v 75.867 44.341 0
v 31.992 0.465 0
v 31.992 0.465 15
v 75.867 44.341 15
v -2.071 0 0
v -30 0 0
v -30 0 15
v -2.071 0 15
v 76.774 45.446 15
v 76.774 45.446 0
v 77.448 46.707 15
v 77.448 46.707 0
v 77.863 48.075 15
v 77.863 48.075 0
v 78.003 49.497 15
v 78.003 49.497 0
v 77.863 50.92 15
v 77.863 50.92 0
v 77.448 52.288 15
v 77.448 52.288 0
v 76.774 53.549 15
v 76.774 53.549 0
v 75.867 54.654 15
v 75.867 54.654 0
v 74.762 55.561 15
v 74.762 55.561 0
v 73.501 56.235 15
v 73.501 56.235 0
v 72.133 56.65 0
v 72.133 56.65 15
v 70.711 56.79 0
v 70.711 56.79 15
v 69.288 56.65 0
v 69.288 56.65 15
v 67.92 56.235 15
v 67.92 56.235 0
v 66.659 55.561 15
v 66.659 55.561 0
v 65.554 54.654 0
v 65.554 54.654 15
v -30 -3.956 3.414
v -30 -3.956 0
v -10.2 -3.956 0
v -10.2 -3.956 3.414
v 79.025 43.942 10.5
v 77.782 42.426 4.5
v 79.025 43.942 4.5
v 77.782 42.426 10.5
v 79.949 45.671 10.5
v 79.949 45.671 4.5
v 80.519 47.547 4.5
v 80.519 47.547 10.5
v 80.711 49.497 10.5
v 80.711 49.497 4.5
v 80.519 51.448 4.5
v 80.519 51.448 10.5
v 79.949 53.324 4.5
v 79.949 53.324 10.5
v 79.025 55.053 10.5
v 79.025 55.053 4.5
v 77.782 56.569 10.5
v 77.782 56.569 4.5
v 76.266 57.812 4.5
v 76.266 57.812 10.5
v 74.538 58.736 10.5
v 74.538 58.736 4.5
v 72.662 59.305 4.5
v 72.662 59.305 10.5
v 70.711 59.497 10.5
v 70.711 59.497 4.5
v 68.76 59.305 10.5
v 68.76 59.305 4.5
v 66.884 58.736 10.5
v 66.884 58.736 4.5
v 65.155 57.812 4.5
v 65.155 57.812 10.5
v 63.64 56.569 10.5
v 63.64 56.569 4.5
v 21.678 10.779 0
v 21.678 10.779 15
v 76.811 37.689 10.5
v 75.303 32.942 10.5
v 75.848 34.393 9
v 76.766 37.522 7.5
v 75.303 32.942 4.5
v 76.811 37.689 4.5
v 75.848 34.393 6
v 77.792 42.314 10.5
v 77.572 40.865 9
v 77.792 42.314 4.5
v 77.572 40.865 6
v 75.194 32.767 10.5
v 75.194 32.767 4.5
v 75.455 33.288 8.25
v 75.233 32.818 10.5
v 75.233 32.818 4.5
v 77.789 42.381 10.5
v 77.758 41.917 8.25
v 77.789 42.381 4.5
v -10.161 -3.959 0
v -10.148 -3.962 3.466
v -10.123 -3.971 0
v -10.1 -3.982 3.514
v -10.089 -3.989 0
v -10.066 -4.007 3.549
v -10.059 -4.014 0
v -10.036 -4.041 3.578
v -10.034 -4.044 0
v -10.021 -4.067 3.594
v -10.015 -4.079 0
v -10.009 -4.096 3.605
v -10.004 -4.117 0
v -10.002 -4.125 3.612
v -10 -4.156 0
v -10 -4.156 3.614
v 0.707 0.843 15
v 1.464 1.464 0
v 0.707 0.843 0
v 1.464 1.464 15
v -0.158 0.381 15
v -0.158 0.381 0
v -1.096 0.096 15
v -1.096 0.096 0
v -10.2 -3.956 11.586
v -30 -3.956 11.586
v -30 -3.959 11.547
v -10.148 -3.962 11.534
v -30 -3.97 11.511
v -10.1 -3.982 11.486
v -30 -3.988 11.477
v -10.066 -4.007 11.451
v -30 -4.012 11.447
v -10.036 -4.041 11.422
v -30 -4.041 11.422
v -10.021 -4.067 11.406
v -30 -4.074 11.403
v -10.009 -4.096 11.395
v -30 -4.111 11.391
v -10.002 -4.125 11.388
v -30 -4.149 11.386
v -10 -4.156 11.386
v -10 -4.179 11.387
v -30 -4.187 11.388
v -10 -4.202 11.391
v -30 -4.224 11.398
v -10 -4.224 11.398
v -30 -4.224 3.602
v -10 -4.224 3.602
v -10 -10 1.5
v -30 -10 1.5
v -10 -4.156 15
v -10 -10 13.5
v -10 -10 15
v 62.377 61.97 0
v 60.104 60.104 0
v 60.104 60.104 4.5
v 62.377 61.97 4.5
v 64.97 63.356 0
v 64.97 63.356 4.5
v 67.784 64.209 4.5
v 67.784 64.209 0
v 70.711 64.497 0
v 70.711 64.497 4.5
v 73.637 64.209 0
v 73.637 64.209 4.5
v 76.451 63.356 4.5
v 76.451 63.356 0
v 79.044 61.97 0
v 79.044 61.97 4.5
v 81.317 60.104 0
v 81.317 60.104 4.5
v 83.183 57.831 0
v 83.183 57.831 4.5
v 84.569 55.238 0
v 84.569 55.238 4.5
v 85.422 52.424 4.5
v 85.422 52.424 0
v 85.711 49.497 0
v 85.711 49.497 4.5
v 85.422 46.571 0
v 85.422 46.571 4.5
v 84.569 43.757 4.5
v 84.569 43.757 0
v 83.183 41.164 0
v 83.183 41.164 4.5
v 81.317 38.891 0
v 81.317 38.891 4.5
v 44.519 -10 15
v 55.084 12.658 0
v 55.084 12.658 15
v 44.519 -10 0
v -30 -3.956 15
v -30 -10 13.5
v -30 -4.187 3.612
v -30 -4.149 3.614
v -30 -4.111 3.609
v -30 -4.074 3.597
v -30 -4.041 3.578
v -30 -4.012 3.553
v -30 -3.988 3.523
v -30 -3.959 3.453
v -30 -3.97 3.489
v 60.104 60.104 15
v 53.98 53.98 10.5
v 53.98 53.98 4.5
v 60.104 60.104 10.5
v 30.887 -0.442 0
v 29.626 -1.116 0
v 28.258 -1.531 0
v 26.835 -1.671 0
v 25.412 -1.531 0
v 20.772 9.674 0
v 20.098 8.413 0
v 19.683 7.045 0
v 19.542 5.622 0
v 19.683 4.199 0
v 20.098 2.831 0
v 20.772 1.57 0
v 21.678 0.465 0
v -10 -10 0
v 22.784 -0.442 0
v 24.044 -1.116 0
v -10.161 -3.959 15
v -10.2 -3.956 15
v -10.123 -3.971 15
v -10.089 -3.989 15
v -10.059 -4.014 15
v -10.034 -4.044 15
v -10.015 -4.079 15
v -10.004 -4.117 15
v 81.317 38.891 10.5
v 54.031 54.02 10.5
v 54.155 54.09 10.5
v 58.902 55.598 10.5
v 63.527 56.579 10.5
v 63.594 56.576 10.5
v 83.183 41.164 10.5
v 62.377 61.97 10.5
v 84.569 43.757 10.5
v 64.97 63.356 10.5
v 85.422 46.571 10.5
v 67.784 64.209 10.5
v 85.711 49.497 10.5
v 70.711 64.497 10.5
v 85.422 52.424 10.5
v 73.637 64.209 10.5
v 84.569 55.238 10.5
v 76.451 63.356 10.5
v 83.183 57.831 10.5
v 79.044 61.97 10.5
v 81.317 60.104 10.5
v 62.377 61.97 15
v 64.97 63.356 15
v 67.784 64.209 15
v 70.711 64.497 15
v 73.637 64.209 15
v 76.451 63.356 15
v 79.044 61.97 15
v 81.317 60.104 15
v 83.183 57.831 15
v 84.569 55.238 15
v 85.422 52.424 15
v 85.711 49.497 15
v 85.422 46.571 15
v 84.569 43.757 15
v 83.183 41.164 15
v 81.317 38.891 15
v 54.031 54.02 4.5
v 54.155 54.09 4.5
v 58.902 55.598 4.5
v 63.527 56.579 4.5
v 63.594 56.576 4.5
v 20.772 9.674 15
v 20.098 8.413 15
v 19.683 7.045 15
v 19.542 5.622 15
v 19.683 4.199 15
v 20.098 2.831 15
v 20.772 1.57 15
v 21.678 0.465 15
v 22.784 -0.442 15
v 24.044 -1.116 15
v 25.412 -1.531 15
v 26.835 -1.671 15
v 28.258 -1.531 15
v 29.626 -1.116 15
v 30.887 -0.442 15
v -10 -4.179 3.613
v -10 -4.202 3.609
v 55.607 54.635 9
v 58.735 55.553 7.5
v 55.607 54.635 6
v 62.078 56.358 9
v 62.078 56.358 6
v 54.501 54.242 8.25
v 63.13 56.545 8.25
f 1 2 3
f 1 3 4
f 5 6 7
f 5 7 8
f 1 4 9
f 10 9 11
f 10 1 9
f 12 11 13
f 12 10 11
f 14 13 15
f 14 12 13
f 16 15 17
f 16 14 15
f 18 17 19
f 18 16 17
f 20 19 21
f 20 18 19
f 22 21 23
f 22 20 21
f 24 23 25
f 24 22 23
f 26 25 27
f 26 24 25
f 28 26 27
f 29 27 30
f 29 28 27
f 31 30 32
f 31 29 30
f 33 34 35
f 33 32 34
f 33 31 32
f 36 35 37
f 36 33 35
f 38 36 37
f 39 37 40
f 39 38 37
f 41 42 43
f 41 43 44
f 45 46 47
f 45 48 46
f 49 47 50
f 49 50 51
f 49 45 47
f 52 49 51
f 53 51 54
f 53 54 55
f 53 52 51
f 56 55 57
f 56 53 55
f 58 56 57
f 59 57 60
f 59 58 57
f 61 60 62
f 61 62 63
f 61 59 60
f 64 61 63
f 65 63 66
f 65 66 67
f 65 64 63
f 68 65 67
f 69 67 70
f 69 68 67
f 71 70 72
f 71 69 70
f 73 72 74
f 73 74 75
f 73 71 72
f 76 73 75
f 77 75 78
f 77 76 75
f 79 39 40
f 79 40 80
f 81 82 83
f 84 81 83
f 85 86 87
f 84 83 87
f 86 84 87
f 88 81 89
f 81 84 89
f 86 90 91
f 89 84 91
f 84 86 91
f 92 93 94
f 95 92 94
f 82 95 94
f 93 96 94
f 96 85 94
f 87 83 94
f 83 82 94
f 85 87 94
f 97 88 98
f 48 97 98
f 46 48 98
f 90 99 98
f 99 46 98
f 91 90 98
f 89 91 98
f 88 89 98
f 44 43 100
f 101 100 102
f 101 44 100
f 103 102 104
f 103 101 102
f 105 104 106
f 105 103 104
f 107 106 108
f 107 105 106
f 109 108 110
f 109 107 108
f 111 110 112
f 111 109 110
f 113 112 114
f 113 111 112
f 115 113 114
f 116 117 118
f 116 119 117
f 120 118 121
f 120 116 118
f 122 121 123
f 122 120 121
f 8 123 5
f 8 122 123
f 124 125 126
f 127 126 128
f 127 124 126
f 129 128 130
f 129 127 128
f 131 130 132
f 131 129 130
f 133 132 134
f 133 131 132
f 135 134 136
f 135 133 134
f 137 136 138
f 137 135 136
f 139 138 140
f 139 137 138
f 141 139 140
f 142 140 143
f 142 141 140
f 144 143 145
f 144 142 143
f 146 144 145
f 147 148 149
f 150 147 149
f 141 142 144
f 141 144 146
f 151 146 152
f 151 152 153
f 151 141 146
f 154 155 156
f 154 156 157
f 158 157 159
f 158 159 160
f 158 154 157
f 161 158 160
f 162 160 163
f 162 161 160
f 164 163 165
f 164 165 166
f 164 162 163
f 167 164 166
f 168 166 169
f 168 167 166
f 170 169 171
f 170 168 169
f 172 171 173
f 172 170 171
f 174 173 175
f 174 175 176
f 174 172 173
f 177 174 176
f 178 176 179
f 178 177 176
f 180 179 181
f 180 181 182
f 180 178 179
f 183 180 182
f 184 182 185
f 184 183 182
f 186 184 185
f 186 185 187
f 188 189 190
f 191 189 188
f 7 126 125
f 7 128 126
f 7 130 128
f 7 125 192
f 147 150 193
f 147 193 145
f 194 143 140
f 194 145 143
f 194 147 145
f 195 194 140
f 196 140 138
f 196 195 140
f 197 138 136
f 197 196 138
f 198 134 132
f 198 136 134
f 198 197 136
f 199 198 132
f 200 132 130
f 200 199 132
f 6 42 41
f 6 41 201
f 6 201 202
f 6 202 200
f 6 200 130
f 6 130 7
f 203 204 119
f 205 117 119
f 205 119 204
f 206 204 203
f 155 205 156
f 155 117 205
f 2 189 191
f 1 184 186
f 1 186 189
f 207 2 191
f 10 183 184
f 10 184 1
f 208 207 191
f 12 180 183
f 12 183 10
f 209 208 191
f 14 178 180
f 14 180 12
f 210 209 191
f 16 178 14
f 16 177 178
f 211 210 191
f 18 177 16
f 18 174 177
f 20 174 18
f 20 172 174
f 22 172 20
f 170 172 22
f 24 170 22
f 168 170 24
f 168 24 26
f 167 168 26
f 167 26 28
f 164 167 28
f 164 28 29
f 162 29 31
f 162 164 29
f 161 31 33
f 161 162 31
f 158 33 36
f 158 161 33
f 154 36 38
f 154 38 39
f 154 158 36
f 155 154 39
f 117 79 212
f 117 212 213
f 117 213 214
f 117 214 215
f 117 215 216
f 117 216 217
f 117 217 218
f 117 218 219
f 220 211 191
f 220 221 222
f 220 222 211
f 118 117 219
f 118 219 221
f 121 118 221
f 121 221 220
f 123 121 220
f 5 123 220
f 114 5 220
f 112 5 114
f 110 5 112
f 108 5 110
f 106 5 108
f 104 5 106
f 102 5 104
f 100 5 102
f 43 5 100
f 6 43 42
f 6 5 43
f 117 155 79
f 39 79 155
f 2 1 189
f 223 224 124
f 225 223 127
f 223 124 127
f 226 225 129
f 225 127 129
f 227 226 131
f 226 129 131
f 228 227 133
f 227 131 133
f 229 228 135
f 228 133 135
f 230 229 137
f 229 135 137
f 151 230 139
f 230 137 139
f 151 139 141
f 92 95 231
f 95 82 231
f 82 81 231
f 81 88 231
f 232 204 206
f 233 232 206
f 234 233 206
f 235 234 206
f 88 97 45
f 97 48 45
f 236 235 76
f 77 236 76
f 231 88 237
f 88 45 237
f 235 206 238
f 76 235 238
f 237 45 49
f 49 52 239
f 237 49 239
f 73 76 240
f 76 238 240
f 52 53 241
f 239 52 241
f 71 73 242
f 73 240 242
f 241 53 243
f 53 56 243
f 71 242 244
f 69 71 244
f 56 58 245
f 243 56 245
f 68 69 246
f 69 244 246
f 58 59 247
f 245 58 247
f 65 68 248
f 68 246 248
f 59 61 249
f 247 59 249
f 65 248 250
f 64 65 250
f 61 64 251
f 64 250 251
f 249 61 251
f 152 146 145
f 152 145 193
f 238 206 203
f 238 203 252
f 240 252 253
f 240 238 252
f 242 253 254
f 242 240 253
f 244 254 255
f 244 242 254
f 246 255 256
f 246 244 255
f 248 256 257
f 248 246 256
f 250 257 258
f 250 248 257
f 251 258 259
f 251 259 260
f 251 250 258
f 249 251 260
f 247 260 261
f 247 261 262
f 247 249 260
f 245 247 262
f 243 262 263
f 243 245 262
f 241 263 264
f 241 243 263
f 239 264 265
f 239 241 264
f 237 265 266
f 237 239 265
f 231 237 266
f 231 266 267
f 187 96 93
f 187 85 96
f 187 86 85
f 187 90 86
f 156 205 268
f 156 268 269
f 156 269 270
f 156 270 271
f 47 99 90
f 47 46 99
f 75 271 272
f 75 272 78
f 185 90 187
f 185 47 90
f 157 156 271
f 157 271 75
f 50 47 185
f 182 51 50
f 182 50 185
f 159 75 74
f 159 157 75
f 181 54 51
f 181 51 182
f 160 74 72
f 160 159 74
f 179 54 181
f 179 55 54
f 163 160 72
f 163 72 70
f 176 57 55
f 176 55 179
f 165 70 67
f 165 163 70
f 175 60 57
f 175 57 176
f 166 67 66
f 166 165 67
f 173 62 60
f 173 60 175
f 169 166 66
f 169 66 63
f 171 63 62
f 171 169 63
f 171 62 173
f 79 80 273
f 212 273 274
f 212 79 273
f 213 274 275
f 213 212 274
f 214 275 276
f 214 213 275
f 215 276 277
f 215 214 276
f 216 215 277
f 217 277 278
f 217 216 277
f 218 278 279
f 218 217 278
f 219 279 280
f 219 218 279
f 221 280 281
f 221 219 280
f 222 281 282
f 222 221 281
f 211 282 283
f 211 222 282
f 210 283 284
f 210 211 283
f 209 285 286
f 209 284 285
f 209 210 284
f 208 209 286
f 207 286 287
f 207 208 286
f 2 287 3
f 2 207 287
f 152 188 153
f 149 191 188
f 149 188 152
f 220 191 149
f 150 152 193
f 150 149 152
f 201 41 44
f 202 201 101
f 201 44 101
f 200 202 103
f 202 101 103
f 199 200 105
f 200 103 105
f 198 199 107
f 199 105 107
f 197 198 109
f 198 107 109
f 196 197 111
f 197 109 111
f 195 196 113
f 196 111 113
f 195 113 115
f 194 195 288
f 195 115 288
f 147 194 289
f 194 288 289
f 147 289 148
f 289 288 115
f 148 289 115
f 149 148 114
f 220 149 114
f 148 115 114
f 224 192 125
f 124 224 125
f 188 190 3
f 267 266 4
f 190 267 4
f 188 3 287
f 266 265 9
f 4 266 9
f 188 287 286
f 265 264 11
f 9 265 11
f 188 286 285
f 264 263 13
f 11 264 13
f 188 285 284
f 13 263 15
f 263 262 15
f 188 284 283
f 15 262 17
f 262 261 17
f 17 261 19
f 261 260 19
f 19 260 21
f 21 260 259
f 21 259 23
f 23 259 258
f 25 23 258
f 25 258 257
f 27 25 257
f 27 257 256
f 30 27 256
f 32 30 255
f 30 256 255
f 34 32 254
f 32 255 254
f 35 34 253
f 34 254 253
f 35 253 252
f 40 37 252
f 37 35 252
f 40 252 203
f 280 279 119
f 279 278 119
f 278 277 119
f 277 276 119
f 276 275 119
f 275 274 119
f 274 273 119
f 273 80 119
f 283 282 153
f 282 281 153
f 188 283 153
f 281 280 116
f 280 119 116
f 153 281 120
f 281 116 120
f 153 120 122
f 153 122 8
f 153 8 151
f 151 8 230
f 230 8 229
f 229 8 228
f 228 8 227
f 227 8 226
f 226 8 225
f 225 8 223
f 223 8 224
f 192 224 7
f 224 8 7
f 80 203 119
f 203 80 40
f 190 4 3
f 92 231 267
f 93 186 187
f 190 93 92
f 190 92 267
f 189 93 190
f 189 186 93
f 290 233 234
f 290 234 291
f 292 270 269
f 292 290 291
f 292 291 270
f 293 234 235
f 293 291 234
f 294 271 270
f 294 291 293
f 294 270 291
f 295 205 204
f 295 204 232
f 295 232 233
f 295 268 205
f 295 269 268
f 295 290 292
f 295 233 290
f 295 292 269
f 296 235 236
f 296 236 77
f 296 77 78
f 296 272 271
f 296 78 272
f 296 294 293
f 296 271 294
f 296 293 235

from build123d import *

# Parameters (mm, degrees)
BOSS_EXTRUDE1_DEPTH = 15
FILLET1_R           = 5
SKETCH4_W           = 6
SKETCH4_H           = 10
FILLET3_START       = 4.5
FILLET3_DEPTH       = 6
CUT_EXTRUDE1_REACH  = 110.311
CUT_EXTRUDE2_DEPTH  = 20
FILLET4_R           = 0.2


with BuildPart() as part:
    # Sketch1 → Boss-Extrude1 (new body)
    with BuildSketch(Plane.XY):
        with BuildLine():
            Line((0, 0), (60.104076401, 60.104076401))
            ThreePointArc((60.104076401, 60.104076401), (81.317279836, 60.104076401), (81.317279836, 38.890872965))
            Line((81.317279836, 38.890872965), (55.084101547, 12.657694676))
            Line((55.084101547, 12.657694676), (44.518645004, -10))
            Line((44.518645004, -10), (-30, -10))
            Line((-30, -10), (-30, 0))
            Line((-30, 0), (0, 0))
        make_face()
    extrude(amount=BOSS_EXTRUDE1_DEPTH)

    # Fillet1
    fillet1_edges = [part.edges().sort_by_distance(p)[0] for p in [
        (0, 0, 7.5),
    ]]
    fillet(fillet1_edges, radius=FILLET1_R)

    # Cut-Sweep1: sweep along a path in Sketch3
    with BuildLine(Plane.XY.offset(7.5)) as cut_sweep1_path:
        ThreePointArc((81.317279836, 38.890872965), (81.317279836, 60.104076401), (60.104076401, 60.104076401))
    # Sketch4 → Cut-Sweep1 (sweep, cut)
    with BuildSketch(Plane(origin=(60.104076401, 60.104076401, 0), x_dir=(0, 0, -1), z_dir=(-0.7071067811865462, -0.7071067811865489, 0))):
        with Locations((-7.5, 0)):
            Rectangle(SKETCH4_W, SKETCH4_H)
    sweep(path=cut_sweep1_path.line, mode=Mode.SUBTRACT)

    # Fillet3: read off the stored shape, not the designer's step
    # Fillet3 outline → Fillet3 (cut)
    with BuildSketch(Plane.XY.offset(FILLET3_START)):
        with BuildLine():
            add(Edge.make_bspline(
                [(75.193555479, 32.767148608), (79.276038384, 36.849631513), (77.781745931, 42.426406871)],
                knots=[0, 0, 0, 1, 1, 1], degree=2, weights=[1, 0.111111111, 1]))
            Line((75.193555479, 32.767148608), (81.317279836, 38.890872965))
            Line((81.317279836, 38.890872965), (77.781745931, 42.426406871))
        make_face()
        with BuildLine():
            Line((60.104076401, 60.104076401), (53.980352044, 53.980352044))
            add(Edge.make_bspline(
                [(53.980352044, 53.980352044), (58.062834949, 58.062834949), (63.639610307, 56.568542495)],
                knots=[0, 0, 0, 1, 1, 1], degree=2, weights=[1, 0.111111111, 1]))
            Line((63.639610307, 56.568542495), (60.104076401, 60.104076401))
        make_face()
    extrude(amount=FILLET3_DEPTH, mode=Mode.SUBTRACT)

    # Sketch5 → Cut-Extrude1 (cut, up to next)
    with BuildSketch(Plane(origin=(0, 0, 0), x_dir=(-1, 0, 0), z_dir=(0, 0, -1)), mode=Mode.PRIVATE) as cut_extrude1_sk1:
        with BuildLine():
            Line((-65.553913935, 54.654238867), (-21.67846541, 10.778790341))
            ThreePointArc((-21.67846541, 10.778790341), (-21.67846541, 0.465261974), (-31.991993777, 0.465261974))
            Line((-31.991993777, 0.465261974), (-75.867442302, 44.3407105))
            ThreePointArc((-75.867442302, 44.3407105), (-75.867442302, 54.654238867), (-65.553913935, 54.654238867))
        make_face()
    cut_extrude1_tool1 = extrude(cut_extrude1_sk1.sketch, amount=-CUT_EXTRUDE1_REACH, mode=Mode.PRIVATE) & part.part
    add(cut_extrude1_tool1.solids().sort_by_distance((48.772954, 27.55975, 0))[0], mode=Mode.SUBTRACT)

    # Sketch7 → Cut-Extrude2 (cut)
    with BuildSketch(Plane.ZY.offset(30)):
        Polygon((15, -3.955549677), (11.3, -3.955549677), (13.5, -10), (15, -10), align=None)
        Polygon((0, -10), (0, -3.955549677), (3.7, -3.955549677), (1.5, -10), align=None)
    extrude(amount=-CUT_EXTRUDE2_DEPTH, mode=Mode.SUBTRACT)

    # Fillet4
    fillet4_edges = [part.edges().sort_by_distance(p)[0] for p in [
        (-10, -3.955549677, 13.15),
        (-20, -3.955549677, 11.3),
        (-10, -3.955549677, 1.85),
        (-20, -3.955549677, 3.7),
    ]]
    fillet(fillet4_edges, radius=FILLET4_R)


solid = part.part
